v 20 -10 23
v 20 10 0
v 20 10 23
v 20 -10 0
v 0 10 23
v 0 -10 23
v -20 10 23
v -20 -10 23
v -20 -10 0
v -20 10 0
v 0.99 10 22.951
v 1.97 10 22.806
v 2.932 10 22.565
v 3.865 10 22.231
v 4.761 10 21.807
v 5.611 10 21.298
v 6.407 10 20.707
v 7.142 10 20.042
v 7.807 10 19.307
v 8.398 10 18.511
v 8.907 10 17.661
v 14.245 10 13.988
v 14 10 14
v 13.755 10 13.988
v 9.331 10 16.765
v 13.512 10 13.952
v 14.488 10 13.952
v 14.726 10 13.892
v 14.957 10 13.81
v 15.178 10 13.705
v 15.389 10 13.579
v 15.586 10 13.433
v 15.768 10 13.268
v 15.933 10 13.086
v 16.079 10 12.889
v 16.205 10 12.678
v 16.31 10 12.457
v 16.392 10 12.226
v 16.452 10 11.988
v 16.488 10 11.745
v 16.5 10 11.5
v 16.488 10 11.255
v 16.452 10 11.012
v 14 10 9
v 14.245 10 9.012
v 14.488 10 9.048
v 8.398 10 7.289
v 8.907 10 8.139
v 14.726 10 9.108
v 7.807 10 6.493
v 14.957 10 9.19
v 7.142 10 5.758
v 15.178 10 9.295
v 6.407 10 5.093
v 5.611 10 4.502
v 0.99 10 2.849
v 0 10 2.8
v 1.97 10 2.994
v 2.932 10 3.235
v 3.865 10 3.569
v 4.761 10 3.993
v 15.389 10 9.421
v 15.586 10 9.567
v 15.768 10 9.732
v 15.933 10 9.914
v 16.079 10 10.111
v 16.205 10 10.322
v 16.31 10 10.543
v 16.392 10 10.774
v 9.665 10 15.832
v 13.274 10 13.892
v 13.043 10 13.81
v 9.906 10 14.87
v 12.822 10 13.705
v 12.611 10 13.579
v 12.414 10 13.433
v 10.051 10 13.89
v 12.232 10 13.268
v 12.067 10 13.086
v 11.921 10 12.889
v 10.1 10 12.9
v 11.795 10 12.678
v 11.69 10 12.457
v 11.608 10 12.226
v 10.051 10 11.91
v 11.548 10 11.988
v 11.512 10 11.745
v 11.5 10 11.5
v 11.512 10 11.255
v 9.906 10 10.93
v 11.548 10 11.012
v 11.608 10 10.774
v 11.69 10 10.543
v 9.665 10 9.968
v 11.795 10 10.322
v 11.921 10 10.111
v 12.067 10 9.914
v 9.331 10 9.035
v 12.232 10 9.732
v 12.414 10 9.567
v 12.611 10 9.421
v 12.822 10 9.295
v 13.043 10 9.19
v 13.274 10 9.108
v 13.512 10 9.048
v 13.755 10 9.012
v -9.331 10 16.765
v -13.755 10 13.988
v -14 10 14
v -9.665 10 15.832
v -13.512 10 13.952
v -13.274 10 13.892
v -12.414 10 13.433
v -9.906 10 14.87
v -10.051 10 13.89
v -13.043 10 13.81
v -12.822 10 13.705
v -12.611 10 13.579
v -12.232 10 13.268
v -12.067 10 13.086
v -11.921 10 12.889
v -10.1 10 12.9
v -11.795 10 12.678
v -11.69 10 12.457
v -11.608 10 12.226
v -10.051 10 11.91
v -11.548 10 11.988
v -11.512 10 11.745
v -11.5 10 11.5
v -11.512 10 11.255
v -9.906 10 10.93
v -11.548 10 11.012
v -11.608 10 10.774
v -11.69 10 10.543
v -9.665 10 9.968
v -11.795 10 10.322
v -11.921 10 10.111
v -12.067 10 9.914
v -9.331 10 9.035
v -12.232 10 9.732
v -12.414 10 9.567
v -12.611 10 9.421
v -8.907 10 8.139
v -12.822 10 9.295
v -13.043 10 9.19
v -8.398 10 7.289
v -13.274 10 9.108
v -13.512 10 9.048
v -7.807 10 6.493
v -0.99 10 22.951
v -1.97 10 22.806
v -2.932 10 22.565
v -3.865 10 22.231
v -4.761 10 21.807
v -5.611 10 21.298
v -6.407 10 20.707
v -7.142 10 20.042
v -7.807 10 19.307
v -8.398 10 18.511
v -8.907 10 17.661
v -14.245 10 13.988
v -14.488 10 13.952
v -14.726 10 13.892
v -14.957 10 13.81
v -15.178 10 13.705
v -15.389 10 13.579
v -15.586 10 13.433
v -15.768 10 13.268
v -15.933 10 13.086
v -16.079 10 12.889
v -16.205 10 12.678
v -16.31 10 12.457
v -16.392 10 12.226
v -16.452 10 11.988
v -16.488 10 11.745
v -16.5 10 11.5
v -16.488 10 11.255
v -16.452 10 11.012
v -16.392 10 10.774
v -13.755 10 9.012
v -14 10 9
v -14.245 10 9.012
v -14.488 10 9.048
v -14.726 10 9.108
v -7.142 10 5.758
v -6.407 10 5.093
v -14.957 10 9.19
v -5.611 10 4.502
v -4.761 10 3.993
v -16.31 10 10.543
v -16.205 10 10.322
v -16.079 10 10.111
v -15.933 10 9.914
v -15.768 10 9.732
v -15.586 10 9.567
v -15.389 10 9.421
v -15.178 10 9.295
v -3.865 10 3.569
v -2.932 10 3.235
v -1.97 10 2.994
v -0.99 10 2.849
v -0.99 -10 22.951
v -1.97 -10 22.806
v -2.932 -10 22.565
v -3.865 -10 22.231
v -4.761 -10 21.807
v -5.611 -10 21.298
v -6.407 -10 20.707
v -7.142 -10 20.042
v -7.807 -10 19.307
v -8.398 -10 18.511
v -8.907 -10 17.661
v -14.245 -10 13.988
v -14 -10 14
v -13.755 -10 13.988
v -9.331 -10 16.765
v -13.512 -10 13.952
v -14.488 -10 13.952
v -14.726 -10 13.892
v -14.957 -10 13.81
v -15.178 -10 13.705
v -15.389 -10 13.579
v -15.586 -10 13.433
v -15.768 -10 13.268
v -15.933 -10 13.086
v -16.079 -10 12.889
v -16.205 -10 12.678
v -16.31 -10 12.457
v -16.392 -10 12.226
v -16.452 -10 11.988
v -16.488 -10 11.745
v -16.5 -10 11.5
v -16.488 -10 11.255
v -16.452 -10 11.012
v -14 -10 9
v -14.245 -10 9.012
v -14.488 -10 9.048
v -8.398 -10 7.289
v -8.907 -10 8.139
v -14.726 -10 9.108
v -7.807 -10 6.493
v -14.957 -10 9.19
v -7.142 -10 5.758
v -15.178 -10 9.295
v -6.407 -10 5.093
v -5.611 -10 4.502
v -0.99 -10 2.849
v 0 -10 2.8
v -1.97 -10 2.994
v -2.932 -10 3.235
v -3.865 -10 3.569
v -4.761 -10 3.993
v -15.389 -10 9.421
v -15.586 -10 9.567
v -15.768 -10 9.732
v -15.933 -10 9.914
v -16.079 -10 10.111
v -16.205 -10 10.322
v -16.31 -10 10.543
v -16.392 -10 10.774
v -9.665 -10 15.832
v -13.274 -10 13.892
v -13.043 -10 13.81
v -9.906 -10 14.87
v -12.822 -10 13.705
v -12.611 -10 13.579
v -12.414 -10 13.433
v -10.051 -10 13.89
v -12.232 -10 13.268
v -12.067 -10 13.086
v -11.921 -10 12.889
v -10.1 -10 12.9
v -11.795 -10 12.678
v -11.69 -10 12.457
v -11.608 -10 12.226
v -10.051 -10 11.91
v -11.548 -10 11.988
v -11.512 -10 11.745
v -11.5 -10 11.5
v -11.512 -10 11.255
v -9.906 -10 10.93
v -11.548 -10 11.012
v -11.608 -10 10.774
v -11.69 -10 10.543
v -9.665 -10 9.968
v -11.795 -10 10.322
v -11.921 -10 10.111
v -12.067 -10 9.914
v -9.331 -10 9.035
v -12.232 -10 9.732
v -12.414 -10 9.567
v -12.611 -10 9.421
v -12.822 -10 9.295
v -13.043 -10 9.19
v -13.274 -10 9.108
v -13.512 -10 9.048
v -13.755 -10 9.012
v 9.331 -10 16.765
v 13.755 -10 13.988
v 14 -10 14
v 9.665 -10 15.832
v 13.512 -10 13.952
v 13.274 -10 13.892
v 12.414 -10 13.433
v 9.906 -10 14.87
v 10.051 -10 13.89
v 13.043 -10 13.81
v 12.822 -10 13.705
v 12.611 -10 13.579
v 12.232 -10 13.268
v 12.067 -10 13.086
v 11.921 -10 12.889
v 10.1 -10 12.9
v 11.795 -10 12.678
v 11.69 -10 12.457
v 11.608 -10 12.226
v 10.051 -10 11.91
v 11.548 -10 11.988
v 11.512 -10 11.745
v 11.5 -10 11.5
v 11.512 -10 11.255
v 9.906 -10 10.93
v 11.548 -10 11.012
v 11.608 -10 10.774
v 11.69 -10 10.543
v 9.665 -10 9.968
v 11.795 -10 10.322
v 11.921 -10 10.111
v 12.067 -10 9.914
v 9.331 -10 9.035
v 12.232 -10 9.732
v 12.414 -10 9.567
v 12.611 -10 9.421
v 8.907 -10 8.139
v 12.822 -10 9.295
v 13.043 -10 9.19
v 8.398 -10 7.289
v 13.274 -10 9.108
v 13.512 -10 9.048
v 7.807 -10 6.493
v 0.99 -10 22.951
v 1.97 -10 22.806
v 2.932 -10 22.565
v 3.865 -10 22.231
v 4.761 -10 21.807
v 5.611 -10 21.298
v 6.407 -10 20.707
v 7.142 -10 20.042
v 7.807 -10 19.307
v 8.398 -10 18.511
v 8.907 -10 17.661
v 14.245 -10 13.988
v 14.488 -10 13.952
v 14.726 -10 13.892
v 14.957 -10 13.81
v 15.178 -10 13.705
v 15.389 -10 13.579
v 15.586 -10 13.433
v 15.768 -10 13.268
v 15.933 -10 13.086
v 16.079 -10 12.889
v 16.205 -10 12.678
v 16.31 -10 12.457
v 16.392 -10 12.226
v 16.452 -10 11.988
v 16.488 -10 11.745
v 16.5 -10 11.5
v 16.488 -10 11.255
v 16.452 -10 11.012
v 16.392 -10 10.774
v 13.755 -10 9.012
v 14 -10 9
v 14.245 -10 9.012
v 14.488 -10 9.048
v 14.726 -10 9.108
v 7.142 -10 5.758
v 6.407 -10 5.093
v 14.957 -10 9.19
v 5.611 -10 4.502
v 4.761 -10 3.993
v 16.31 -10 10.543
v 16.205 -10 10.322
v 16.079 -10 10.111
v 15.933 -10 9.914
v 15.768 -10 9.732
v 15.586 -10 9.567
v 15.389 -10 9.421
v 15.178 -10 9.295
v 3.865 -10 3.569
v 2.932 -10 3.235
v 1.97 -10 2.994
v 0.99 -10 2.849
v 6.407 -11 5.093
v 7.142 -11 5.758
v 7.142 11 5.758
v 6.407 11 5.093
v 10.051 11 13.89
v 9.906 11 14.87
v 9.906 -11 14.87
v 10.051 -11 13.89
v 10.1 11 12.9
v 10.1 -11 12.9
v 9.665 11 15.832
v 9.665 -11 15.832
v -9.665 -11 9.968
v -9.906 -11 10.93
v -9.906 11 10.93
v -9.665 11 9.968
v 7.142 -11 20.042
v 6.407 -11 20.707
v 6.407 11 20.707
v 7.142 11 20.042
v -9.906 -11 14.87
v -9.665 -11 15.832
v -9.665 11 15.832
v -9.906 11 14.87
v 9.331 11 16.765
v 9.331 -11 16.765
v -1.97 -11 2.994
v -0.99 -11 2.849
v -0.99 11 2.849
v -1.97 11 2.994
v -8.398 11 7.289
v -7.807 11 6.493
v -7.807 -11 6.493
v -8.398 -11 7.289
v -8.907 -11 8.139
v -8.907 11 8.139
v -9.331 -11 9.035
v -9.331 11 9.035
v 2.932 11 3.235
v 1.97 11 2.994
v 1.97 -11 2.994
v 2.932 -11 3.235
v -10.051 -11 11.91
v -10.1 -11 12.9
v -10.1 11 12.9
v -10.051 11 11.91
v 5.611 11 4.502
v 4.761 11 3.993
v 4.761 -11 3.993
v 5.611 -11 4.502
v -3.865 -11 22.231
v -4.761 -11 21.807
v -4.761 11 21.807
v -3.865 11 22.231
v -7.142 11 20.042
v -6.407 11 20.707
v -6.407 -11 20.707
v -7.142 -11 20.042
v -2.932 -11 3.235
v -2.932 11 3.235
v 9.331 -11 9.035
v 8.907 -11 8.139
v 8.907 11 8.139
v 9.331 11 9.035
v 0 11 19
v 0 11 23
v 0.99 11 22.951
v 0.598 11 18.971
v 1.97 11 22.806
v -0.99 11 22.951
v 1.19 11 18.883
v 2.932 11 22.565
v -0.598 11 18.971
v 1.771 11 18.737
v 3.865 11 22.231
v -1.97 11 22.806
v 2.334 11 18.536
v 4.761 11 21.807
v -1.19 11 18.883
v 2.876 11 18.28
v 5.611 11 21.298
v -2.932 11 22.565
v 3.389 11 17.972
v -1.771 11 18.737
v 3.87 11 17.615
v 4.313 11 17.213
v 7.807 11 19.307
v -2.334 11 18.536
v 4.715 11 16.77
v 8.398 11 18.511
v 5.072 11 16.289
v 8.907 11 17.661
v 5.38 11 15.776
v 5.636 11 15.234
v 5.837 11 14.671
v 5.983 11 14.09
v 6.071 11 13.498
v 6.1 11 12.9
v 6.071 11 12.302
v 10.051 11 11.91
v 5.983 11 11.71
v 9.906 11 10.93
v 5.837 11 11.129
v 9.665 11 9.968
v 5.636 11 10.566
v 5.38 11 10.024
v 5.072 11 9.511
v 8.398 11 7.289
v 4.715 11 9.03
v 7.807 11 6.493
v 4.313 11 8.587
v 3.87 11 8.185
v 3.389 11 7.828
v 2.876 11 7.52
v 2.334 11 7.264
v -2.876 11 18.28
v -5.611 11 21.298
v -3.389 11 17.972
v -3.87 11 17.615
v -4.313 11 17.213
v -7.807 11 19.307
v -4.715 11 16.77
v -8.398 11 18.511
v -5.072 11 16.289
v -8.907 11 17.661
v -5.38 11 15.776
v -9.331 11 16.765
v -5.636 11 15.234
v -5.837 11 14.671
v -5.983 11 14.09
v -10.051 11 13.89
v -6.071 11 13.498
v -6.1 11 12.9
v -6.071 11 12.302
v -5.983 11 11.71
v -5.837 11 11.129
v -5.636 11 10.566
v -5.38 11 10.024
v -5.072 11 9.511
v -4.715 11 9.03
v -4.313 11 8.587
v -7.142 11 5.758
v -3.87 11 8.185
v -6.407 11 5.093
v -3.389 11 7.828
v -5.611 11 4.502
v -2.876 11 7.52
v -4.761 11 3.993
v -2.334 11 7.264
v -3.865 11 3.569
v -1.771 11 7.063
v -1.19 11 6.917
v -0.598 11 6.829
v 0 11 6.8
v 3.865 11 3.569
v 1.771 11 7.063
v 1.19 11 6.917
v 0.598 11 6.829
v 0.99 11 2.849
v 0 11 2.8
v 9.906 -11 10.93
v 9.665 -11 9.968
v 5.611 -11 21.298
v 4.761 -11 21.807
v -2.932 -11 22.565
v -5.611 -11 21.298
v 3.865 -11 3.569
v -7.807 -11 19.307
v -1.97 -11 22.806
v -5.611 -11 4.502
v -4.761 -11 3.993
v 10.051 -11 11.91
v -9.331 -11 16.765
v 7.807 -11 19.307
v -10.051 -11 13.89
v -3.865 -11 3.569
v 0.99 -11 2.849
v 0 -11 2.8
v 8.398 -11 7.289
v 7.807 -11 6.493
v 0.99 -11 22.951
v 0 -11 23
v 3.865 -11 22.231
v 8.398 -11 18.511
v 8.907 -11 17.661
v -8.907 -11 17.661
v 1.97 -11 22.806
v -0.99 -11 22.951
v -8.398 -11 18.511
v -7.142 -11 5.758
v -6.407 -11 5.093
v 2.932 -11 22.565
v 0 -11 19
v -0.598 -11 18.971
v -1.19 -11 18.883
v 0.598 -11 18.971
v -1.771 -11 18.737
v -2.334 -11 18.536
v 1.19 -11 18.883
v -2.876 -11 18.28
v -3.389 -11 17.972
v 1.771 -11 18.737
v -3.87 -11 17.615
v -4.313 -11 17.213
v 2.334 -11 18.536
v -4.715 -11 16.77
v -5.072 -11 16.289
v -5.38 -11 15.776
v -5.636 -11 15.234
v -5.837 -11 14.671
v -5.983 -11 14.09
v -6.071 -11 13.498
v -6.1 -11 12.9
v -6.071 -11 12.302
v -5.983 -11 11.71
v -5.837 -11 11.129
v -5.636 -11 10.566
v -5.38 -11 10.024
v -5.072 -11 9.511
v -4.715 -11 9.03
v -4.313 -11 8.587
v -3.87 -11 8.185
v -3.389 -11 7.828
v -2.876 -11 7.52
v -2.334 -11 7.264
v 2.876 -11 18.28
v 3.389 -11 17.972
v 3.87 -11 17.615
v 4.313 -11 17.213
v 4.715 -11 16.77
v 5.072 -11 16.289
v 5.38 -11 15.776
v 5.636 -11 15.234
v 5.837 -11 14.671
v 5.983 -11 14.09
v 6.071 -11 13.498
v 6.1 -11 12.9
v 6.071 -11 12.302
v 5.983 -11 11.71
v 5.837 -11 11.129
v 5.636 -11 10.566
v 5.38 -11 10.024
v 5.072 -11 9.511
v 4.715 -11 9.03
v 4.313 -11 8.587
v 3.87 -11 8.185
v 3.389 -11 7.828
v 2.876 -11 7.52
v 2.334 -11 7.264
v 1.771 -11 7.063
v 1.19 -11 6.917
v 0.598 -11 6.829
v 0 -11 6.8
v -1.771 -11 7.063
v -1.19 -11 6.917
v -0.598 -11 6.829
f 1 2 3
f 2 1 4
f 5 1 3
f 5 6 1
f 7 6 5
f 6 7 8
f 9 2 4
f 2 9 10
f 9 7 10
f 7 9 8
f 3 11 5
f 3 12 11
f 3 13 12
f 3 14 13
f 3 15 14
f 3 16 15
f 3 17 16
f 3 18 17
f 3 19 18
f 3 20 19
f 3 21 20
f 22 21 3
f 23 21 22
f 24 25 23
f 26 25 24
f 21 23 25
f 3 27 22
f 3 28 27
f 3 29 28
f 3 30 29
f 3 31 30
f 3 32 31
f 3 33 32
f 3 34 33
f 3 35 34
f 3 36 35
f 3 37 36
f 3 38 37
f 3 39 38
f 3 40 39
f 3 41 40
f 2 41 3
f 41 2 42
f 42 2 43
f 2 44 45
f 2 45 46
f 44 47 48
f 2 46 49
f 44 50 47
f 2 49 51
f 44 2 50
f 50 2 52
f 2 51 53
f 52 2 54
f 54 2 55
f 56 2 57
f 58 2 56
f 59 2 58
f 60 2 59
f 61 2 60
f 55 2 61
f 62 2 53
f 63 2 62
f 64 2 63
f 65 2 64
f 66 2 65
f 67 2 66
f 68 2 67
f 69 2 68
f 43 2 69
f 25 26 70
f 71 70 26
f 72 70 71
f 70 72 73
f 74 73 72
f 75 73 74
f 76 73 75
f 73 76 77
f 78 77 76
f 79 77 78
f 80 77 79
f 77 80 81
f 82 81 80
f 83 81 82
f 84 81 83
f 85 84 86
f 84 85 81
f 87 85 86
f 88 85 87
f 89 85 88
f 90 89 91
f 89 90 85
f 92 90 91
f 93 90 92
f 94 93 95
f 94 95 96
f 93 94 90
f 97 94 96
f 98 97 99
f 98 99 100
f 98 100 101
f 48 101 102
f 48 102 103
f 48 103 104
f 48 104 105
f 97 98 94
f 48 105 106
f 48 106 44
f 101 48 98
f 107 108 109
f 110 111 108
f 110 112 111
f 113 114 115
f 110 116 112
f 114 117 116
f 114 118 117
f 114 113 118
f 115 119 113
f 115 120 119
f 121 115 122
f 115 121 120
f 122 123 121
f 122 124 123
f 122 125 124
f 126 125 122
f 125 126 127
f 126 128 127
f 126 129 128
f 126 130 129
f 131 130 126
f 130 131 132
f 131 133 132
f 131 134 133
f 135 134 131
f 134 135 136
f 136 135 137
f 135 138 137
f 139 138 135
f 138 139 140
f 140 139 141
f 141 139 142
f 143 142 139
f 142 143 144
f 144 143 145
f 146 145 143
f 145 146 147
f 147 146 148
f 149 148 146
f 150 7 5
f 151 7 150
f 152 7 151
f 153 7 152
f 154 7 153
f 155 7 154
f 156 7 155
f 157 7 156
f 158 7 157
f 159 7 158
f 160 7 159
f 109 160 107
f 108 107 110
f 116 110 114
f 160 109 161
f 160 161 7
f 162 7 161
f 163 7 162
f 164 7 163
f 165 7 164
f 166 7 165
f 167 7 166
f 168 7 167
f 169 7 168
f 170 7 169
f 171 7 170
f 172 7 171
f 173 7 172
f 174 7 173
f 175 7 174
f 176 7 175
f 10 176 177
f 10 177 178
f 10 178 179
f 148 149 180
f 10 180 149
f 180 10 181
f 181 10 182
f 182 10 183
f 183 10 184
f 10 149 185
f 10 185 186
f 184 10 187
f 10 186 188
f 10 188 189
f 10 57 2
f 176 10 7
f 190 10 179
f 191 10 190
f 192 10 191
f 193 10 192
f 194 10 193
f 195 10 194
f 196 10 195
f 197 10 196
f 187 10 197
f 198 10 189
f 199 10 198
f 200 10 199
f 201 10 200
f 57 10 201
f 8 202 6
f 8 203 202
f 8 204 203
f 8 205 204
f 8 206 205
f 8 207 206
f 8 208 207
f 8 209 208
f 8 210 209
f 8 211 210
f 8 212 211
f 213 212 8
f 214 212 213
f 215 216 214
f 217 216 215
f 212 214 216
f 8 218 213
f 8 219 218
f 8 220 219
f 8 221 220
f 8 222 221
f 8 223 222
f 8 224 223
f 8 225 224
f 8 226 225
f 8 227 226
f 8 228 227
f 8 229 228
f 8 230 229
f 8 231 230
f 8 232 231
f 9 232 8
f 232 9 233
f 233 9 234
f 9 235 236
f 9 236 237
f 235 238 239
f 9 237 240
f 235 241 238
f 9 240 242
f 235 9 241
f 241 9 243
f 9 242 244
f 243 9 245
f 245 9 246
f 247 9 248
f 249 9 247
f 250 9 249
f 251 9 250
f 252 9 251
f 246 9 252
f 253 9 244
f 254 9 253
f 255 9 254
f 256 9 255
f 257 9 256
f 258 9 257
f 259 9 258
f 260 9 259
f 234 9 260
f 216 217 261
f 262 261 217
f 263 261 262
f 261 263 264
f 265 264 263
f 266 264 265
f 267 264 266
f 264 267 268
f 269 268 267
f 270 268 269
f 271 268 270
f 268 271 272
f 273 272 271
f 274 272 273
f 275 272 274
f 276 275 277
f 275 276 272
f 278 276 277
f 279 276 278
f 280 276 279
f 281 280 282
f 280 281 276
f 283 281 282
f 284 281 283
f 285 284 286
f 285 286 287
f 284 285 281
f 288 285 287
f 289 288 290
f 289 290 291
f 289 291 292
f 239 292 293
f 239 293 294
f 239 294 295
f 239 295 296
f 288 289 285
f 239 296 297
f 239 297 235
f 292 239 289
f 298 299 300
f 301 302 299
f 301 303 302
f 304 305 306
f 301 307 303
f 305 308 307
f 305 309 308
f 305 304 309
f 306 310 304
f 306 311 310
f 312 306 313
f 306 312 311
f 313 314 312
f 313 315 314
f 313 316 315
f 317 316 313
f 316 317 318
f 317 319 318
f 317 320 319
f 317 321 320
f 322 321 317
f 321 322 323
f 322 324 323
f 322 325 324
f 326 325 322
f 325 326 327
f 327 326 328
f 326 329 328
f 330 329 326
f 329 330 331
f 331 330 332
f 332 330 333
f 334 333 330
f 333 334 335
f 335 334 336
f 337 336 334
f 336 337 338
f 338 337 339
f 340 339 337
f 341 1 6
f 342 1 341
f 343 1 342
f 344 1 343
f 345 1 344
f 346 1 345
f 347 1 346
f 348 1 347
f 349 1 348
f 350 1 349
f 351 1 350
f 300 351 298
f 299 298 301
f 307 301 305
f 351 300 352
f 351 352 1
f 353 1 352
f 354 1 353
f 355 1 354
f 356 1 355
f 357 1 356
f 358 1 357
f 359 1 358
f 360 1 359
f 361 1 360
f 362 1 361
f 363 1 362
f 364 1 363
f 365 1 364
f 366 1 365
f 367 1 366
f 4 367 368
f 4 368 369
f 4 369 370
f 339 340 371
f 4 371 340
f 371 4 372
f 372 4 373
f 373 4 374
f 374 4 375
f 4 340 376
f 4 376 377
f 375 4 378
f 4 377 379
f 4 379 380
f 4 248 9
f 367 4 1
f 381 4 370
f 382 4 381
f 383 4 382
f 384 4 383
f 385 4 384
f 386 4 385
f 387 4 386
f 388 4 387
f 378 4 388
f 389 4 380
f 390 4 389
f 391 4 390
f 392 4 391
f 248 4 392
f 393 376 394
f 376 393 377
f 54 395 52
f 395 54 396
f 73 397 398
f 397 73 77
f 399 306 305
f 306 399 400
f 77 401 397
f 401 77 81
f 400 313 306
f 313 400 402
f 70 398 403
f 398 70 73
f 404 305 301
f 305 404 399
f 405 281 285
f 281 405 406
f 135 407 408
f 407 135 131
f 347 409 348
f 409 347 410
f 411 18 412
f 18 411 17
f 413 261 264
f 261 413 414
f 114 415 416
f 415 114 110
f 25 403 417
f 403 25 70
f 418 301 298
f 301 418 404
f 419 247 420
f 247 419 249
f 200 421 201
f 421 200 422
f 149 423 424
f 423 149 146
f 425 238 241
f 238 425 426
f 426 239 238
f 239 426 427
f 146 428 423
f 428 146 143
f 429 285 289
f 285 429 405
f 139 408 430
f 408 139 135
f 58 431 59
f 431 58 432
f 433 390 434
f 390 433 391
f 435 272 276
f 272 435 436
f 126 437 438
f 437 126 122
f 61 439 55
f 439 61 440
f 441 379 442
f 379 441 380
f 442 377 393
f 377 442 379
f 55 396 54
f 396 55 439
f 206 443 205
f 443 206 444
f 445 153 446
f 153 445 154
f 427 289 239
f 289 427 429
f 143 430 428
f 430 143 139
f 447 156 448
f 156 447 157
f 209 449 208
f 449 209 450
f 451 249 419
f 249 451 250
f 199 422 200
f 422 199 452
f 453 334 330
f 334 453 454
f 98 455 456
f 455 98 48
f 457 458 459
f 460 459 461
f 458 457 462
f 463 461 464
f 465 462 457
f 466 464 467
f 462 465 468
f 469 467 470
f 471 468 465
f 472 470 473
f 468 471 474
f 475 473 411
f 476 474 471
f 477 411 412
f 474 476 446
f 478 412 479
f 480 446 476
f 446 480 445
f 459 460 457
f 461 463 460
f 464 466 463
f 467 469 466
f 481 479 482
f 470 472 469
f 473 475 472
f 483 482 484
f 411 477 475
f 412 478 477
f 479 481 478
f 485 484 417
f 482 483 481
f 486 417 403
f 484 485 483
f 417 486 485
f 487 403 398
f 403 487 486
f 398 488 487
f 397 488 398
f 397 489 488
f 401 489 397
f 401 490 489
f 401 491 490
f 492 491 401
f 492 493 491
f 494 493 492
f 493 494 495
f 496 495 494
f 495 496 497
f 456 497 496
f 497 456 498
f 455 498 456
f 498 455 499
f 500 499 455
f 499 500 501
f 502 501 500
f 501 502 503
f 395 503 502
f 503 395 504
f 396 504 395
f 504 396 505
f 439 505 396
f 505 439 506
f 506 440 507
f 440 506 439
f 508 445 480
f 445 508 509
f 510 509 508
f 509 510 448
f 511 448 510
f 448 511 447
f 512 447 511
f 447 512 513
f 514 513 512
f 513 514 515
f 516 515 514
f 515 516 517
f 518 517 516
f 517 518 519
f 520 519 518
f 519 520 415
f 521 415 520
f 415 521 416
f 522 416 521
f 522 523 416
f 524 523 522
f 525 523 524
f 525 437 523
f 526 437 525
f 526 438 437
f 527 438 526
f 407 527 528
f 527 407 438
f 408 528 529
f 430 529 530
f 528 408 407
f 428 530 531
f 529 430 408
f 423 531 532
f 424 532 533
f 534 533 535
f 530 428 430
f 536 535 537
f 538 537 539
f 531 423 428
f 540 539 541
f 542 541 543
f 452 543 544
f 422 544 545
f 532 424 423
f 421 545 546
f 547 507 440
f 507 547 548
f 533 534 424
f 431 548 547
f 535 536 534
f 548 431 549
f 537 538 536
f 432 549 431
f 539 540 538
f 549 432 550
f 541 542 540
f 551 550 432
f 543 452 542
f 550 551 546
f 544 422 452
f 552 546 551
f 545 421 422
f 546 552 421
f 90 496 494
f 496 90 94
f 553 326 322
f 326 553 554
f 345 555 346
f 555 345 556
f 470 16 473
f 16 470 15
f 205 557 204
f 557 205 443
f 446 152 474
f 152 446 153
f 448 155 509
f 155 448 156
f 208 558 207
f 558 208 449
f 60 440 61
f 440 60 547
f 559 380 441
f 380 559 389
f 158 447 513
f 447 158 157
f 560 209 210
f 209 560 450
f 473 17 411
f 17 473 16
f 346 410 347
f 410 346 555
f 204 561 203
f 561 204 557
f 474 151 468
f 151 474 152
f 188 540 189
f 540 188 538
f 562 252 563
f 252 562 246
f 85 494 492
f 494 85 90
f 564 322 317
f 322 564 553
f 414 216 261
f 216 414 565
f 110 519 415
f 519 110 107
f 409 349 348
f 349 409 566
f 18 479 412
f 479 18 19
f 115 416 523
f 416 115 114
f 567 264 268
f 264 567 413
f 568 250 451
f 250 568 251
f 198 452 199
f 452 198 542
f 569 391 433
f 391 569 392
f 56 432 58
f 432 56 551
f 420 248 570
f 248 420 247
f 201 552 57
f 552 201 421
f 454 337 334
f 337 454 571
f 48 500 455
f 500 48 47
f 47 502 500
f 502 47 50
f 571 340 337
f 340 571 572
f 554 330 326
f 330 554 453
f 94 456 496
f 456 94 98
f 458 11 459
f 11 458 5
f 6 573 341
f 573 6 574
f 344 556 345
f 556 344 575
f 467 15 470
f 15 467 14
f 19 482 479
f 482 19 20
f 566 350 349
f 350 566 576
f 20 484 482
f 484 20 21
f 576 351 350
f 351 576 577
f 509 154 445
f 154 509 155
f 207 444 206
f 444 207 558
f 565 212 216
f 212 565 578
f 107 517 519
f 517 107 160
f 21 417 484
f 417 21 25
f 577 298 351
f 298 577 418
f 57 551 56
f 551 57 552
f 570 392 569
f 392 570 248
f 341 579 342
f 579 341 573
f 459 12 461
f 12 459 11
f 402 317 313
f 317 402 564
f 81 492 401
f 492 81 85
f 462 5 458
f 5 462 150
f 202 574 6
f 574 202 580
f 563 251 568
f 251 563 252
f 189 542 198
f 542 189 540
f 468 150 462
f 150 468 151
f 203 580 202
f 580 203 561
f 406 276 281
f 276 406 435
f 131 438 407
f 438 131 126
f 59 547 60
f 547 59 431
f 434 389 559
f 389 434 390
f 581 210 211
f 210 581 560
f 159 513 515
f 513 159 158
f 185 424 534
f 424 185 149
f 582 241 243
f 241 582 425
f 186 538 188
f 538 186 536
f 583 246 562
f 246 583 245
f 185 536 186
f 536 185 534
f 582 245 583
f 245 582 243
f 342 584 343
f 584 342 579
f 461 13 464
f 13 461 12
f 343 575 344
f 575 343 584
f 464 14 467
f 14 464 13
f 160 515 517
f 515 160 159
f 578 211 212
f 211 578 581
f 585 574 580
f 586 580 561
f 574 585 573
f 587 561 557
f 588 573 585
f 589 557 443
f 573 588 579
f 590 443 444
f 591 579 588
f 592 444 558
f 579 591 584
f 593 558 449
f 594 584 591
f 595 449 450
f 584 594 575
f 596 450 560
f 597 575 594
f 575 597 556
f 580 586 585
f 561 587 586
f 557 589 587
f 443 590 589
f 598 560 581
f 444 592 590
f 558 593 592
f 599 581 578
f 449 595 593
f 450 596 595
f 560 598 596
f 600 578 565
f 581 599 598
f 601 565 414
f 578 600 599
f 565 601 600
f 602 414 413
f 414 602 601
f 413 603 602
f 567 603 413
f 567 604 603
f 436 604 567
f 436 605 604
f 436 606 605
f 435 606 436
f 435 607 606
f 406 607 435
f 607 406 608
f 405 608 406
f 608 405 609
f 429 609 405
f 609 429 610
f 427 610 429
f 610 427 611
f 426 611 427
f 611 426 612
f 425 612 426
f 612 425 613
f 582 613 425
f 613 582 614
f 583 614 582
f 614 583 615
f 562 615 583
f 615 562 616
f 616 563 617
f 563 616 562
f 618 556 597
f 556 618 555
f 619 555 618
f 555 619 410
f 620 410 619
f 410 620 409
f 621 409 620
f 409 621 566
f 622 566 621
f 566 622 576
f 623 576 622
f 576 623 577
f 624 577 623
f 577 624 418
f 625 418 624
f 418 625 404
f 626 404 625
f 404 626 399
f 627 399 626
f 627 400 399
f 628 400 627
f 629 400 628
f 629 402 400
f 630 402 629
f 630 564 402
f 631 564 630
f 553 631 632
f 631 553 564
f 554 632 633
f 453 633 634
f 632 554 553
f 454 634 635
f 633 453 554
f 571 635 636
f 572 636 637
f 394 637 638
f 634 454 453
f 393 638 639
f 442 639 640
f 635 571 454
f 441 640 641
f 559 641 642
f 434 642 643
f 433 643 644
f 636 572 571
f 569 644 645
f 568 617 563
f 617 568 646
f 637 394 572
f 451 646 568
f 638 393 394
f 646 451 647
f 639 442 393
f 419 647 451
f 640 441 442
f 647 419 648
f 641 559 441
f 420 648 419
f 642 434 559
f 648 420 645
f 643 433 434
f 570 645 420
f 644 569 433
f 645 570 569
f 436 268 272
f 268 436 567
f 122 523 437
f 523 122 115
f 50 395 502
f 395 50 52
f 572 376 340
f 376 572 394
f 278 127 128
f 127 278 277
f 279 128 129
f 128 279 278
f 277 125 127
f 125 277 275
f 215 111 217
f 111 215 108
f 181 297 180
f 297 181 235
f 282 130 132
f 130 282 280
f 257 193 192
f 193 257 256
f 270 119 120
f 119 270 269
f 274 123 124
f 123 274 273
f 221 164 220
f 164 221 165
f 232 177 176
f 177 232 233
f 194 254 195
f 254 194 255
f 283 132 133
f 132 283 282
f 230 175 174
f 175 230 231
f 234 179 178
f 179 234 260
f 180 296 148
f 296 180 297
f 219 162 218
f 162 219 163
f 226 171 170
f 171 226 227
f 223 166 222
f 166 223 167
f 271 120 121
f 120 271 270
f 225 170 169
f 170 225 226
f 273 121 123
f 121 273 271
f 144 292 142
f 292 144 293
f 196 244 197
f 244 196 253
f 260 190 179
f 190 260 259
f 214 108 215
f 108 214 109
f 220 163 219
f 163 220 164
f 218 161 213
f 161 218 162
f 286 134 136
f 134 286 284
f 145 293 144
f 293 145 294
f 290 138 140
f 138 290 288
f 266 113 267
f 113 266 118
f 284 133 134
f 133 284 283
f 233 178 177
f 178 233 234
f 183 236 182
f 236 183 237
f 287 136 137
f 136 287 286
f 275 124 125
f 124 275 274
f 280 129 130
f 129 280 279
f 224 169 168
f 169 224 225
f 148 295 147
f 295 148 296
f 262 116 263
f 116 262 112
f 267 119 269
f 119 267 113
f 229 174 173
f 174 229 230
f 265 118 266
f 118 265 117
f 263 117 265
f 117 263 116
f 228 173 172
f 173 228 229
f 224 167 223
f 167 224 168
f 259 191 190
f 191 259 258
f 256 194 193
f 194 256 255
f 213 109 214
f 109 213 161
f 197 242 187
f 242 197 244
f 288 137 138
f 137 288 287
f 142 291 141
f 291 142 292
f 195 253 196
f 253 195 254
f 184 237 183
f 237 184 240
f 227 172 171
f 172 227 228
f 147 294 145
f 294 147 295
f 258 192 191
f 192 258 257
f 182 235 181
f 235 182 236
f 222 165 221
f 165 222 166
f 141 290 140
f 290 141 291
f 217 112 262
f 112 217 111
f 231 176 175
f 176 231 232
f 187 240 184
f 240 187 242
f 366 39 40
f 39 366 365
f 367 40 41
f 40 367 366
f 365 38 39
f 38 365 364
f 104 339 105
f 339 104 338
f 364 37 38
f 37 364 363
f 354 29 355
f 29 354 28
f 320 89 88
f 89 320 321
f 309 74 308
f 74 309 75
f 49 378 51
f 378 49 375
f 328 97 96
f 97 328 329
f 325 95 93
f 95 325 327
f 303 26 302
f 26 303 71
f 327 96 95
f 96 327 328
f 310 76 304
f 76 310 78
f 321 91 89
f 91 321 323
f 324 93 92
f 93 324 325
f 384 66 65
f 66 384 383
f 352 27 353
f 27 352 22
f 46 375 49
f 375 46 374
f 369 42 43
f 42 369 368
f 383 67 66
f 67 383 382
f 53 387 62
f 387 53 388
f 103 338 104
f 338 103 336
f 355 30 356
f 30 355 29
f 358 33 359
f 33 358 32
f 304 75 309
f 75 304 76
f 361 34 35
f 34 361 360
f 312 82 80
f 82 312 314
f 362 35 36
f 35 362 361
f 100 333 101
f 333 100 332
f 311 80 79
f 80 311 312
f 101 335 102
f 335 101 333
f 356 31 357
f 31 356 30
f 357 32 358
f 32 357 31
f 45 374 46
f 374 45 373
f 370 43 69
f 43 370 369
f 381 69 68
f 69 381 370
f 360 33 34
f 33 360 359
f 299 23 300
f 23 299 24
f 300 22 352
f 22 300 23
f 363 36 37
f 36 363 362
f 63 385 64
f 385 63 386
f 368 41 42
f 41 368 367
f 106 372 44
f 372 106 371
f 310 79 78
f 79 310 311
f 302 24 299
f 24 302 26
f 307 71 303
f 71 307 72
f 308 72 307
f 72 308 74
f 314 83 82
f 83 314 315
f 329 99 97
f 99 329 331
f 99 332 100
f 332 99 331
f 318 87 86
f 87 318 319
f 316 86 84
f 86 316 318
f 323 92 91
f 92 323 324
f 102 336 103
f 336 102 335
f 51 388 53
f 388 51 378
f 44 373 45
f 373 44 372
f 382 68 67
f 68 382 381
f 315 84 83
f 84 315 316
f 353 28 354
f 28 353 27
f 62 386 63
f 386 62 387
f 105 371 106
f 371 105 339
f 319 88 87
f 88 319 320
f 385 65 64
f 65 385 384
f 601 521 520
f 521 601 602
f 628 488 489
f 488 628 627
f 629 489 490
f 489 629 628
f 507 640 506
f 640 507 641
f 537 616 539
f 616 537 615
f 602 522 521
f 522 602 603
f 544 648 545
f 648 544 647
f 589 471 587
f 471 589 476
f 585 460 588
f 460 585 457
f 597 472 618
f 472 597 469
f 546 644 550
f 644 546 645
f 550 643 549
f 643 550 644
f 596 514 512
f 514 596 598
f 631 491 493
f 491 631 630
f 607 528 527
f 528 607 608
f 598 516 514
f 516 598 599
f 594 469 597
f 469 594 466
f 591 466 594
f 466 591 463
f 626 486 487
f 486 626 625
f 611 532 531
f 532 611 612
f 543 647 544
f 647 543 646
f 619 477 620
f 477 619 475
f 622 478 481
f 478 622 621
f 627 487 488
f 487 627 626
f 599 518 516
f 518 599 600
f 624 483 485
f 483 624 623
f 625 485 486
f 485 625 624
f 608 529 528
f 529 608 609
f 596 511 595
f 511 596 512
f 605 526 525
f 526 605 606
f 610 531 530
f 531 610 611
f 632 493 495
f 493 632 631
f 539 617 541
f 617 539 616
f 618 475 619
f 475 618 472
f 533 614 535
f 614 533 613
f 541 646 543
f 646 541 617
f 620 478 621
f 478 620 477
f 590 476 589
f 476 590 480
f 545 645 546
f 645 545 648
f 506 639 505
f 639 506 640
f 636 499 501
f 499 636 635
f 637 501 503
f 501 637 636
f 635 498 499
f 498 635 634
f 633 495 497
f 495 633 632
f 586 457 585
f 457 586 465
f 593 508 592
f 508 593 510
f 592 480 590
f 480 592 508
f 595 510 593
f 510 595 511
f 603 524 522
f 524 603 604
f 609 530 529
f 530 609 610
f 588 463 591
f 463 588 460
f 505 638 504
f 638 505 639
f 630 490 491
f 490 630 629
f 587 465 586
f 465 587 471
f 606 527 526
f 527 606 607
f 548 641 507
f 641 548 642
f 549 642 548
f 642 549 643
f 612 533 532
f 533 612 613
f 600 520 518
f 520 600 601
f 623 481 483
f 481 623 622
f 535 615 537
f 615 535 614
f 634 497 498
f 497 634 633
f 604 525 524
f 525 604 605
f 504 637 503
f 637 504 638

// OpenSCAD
// Shaft support bracket for 12.0mm rod, 23.0mm tall
// One connected solid (bracket only)

// Parameters
rod_diameter_mm = 12.0; //[6.0:24.0:0.1]
overall_height_mm = 23.0; //[12.0:46.0:0.1]
rod_fit_clearance_mm = 0.2; //[0.0:0.6:0.05]
bracket_wall_thickness_mm = 4.0; //[2.0:8.0:0.1]
base_thickness_mm = 6.0; //[3.0:12.0:0.1]
base_length_mm = 40.0; //[20.0:80.0:0.1]
base_width_mm = 20.0; //[10.0:40.0:0.1]
mount_hole_diameter_mm = 5.0; //[3.0:8.0:0.1]
mount_hole_edge_margin_mm = 6.0; //[3.0:12.0:0.1]
rod_center_height_from_base_mm = 17.0; //[10.0:30.0:0.1]
overlap_mm = 1.0; //[0.5:2.0:0.1]

$fn = 64;

module bracket() {
    // Derived
    rod_r = (rod_diameter_mm + rod_fit_clearance_mm)/2;
    outer_r = rod_r + bracket_wall_thickness_mm;

    // Clamp rod center so the outer cylinder stays within overall height
    rod_center_z = min(
        max(rod_center_height_from_base_mm, outer_r),
        overall_height_mm - outer_r
    );

    // Base spans full height (as in reference views: a vertical plate with two holes)
    base_center_z = overall_height_mm/2;

    // Rod sleeve centered on rod axis, spans the plate thickness (Y)
    sleeve_h = base_width_mm;

    difference() {
        union() {
            // Vertical plate (mounting bracket)
            translate([0, 0, base_center_z])
                cube([base_length_mm, base_width_mm, overall_height_mm], center=true);

            // Rod sleeve (adds material around the rod bore), connected by overlap
            translate([0, 0, rod_center_z])
                rotate([90, 0, 0])
                    cylinder(r=outer_r, h=sleeve_h + 2*overlap_mm, center=true);
        }

        // Mount holes through plate thickness (Y direction)
        for (xpos = [-base_length_mm/2 + mount_hole_edge_margin_mm,
                      base_length_mm/2 - mount_hole_edge_margin_mm]) {
            translate([xpos, 0, base_center_z])
                rotate([90, 0, 0])
                    cylinder(r=mount_hole_diameter_mm/2,
                             h=base_width_mm + 2*overlap_mm,
                             center=true);
        }

        // Rod bore through sleeve (Y direction)
        translate([0, 0, rod_center_z])
            rotate([90, 0, 0])
                cylinder(r=rod_r, h=sleeve_h + 4*overlap_mm, center=true);
    }
}

bracket();
